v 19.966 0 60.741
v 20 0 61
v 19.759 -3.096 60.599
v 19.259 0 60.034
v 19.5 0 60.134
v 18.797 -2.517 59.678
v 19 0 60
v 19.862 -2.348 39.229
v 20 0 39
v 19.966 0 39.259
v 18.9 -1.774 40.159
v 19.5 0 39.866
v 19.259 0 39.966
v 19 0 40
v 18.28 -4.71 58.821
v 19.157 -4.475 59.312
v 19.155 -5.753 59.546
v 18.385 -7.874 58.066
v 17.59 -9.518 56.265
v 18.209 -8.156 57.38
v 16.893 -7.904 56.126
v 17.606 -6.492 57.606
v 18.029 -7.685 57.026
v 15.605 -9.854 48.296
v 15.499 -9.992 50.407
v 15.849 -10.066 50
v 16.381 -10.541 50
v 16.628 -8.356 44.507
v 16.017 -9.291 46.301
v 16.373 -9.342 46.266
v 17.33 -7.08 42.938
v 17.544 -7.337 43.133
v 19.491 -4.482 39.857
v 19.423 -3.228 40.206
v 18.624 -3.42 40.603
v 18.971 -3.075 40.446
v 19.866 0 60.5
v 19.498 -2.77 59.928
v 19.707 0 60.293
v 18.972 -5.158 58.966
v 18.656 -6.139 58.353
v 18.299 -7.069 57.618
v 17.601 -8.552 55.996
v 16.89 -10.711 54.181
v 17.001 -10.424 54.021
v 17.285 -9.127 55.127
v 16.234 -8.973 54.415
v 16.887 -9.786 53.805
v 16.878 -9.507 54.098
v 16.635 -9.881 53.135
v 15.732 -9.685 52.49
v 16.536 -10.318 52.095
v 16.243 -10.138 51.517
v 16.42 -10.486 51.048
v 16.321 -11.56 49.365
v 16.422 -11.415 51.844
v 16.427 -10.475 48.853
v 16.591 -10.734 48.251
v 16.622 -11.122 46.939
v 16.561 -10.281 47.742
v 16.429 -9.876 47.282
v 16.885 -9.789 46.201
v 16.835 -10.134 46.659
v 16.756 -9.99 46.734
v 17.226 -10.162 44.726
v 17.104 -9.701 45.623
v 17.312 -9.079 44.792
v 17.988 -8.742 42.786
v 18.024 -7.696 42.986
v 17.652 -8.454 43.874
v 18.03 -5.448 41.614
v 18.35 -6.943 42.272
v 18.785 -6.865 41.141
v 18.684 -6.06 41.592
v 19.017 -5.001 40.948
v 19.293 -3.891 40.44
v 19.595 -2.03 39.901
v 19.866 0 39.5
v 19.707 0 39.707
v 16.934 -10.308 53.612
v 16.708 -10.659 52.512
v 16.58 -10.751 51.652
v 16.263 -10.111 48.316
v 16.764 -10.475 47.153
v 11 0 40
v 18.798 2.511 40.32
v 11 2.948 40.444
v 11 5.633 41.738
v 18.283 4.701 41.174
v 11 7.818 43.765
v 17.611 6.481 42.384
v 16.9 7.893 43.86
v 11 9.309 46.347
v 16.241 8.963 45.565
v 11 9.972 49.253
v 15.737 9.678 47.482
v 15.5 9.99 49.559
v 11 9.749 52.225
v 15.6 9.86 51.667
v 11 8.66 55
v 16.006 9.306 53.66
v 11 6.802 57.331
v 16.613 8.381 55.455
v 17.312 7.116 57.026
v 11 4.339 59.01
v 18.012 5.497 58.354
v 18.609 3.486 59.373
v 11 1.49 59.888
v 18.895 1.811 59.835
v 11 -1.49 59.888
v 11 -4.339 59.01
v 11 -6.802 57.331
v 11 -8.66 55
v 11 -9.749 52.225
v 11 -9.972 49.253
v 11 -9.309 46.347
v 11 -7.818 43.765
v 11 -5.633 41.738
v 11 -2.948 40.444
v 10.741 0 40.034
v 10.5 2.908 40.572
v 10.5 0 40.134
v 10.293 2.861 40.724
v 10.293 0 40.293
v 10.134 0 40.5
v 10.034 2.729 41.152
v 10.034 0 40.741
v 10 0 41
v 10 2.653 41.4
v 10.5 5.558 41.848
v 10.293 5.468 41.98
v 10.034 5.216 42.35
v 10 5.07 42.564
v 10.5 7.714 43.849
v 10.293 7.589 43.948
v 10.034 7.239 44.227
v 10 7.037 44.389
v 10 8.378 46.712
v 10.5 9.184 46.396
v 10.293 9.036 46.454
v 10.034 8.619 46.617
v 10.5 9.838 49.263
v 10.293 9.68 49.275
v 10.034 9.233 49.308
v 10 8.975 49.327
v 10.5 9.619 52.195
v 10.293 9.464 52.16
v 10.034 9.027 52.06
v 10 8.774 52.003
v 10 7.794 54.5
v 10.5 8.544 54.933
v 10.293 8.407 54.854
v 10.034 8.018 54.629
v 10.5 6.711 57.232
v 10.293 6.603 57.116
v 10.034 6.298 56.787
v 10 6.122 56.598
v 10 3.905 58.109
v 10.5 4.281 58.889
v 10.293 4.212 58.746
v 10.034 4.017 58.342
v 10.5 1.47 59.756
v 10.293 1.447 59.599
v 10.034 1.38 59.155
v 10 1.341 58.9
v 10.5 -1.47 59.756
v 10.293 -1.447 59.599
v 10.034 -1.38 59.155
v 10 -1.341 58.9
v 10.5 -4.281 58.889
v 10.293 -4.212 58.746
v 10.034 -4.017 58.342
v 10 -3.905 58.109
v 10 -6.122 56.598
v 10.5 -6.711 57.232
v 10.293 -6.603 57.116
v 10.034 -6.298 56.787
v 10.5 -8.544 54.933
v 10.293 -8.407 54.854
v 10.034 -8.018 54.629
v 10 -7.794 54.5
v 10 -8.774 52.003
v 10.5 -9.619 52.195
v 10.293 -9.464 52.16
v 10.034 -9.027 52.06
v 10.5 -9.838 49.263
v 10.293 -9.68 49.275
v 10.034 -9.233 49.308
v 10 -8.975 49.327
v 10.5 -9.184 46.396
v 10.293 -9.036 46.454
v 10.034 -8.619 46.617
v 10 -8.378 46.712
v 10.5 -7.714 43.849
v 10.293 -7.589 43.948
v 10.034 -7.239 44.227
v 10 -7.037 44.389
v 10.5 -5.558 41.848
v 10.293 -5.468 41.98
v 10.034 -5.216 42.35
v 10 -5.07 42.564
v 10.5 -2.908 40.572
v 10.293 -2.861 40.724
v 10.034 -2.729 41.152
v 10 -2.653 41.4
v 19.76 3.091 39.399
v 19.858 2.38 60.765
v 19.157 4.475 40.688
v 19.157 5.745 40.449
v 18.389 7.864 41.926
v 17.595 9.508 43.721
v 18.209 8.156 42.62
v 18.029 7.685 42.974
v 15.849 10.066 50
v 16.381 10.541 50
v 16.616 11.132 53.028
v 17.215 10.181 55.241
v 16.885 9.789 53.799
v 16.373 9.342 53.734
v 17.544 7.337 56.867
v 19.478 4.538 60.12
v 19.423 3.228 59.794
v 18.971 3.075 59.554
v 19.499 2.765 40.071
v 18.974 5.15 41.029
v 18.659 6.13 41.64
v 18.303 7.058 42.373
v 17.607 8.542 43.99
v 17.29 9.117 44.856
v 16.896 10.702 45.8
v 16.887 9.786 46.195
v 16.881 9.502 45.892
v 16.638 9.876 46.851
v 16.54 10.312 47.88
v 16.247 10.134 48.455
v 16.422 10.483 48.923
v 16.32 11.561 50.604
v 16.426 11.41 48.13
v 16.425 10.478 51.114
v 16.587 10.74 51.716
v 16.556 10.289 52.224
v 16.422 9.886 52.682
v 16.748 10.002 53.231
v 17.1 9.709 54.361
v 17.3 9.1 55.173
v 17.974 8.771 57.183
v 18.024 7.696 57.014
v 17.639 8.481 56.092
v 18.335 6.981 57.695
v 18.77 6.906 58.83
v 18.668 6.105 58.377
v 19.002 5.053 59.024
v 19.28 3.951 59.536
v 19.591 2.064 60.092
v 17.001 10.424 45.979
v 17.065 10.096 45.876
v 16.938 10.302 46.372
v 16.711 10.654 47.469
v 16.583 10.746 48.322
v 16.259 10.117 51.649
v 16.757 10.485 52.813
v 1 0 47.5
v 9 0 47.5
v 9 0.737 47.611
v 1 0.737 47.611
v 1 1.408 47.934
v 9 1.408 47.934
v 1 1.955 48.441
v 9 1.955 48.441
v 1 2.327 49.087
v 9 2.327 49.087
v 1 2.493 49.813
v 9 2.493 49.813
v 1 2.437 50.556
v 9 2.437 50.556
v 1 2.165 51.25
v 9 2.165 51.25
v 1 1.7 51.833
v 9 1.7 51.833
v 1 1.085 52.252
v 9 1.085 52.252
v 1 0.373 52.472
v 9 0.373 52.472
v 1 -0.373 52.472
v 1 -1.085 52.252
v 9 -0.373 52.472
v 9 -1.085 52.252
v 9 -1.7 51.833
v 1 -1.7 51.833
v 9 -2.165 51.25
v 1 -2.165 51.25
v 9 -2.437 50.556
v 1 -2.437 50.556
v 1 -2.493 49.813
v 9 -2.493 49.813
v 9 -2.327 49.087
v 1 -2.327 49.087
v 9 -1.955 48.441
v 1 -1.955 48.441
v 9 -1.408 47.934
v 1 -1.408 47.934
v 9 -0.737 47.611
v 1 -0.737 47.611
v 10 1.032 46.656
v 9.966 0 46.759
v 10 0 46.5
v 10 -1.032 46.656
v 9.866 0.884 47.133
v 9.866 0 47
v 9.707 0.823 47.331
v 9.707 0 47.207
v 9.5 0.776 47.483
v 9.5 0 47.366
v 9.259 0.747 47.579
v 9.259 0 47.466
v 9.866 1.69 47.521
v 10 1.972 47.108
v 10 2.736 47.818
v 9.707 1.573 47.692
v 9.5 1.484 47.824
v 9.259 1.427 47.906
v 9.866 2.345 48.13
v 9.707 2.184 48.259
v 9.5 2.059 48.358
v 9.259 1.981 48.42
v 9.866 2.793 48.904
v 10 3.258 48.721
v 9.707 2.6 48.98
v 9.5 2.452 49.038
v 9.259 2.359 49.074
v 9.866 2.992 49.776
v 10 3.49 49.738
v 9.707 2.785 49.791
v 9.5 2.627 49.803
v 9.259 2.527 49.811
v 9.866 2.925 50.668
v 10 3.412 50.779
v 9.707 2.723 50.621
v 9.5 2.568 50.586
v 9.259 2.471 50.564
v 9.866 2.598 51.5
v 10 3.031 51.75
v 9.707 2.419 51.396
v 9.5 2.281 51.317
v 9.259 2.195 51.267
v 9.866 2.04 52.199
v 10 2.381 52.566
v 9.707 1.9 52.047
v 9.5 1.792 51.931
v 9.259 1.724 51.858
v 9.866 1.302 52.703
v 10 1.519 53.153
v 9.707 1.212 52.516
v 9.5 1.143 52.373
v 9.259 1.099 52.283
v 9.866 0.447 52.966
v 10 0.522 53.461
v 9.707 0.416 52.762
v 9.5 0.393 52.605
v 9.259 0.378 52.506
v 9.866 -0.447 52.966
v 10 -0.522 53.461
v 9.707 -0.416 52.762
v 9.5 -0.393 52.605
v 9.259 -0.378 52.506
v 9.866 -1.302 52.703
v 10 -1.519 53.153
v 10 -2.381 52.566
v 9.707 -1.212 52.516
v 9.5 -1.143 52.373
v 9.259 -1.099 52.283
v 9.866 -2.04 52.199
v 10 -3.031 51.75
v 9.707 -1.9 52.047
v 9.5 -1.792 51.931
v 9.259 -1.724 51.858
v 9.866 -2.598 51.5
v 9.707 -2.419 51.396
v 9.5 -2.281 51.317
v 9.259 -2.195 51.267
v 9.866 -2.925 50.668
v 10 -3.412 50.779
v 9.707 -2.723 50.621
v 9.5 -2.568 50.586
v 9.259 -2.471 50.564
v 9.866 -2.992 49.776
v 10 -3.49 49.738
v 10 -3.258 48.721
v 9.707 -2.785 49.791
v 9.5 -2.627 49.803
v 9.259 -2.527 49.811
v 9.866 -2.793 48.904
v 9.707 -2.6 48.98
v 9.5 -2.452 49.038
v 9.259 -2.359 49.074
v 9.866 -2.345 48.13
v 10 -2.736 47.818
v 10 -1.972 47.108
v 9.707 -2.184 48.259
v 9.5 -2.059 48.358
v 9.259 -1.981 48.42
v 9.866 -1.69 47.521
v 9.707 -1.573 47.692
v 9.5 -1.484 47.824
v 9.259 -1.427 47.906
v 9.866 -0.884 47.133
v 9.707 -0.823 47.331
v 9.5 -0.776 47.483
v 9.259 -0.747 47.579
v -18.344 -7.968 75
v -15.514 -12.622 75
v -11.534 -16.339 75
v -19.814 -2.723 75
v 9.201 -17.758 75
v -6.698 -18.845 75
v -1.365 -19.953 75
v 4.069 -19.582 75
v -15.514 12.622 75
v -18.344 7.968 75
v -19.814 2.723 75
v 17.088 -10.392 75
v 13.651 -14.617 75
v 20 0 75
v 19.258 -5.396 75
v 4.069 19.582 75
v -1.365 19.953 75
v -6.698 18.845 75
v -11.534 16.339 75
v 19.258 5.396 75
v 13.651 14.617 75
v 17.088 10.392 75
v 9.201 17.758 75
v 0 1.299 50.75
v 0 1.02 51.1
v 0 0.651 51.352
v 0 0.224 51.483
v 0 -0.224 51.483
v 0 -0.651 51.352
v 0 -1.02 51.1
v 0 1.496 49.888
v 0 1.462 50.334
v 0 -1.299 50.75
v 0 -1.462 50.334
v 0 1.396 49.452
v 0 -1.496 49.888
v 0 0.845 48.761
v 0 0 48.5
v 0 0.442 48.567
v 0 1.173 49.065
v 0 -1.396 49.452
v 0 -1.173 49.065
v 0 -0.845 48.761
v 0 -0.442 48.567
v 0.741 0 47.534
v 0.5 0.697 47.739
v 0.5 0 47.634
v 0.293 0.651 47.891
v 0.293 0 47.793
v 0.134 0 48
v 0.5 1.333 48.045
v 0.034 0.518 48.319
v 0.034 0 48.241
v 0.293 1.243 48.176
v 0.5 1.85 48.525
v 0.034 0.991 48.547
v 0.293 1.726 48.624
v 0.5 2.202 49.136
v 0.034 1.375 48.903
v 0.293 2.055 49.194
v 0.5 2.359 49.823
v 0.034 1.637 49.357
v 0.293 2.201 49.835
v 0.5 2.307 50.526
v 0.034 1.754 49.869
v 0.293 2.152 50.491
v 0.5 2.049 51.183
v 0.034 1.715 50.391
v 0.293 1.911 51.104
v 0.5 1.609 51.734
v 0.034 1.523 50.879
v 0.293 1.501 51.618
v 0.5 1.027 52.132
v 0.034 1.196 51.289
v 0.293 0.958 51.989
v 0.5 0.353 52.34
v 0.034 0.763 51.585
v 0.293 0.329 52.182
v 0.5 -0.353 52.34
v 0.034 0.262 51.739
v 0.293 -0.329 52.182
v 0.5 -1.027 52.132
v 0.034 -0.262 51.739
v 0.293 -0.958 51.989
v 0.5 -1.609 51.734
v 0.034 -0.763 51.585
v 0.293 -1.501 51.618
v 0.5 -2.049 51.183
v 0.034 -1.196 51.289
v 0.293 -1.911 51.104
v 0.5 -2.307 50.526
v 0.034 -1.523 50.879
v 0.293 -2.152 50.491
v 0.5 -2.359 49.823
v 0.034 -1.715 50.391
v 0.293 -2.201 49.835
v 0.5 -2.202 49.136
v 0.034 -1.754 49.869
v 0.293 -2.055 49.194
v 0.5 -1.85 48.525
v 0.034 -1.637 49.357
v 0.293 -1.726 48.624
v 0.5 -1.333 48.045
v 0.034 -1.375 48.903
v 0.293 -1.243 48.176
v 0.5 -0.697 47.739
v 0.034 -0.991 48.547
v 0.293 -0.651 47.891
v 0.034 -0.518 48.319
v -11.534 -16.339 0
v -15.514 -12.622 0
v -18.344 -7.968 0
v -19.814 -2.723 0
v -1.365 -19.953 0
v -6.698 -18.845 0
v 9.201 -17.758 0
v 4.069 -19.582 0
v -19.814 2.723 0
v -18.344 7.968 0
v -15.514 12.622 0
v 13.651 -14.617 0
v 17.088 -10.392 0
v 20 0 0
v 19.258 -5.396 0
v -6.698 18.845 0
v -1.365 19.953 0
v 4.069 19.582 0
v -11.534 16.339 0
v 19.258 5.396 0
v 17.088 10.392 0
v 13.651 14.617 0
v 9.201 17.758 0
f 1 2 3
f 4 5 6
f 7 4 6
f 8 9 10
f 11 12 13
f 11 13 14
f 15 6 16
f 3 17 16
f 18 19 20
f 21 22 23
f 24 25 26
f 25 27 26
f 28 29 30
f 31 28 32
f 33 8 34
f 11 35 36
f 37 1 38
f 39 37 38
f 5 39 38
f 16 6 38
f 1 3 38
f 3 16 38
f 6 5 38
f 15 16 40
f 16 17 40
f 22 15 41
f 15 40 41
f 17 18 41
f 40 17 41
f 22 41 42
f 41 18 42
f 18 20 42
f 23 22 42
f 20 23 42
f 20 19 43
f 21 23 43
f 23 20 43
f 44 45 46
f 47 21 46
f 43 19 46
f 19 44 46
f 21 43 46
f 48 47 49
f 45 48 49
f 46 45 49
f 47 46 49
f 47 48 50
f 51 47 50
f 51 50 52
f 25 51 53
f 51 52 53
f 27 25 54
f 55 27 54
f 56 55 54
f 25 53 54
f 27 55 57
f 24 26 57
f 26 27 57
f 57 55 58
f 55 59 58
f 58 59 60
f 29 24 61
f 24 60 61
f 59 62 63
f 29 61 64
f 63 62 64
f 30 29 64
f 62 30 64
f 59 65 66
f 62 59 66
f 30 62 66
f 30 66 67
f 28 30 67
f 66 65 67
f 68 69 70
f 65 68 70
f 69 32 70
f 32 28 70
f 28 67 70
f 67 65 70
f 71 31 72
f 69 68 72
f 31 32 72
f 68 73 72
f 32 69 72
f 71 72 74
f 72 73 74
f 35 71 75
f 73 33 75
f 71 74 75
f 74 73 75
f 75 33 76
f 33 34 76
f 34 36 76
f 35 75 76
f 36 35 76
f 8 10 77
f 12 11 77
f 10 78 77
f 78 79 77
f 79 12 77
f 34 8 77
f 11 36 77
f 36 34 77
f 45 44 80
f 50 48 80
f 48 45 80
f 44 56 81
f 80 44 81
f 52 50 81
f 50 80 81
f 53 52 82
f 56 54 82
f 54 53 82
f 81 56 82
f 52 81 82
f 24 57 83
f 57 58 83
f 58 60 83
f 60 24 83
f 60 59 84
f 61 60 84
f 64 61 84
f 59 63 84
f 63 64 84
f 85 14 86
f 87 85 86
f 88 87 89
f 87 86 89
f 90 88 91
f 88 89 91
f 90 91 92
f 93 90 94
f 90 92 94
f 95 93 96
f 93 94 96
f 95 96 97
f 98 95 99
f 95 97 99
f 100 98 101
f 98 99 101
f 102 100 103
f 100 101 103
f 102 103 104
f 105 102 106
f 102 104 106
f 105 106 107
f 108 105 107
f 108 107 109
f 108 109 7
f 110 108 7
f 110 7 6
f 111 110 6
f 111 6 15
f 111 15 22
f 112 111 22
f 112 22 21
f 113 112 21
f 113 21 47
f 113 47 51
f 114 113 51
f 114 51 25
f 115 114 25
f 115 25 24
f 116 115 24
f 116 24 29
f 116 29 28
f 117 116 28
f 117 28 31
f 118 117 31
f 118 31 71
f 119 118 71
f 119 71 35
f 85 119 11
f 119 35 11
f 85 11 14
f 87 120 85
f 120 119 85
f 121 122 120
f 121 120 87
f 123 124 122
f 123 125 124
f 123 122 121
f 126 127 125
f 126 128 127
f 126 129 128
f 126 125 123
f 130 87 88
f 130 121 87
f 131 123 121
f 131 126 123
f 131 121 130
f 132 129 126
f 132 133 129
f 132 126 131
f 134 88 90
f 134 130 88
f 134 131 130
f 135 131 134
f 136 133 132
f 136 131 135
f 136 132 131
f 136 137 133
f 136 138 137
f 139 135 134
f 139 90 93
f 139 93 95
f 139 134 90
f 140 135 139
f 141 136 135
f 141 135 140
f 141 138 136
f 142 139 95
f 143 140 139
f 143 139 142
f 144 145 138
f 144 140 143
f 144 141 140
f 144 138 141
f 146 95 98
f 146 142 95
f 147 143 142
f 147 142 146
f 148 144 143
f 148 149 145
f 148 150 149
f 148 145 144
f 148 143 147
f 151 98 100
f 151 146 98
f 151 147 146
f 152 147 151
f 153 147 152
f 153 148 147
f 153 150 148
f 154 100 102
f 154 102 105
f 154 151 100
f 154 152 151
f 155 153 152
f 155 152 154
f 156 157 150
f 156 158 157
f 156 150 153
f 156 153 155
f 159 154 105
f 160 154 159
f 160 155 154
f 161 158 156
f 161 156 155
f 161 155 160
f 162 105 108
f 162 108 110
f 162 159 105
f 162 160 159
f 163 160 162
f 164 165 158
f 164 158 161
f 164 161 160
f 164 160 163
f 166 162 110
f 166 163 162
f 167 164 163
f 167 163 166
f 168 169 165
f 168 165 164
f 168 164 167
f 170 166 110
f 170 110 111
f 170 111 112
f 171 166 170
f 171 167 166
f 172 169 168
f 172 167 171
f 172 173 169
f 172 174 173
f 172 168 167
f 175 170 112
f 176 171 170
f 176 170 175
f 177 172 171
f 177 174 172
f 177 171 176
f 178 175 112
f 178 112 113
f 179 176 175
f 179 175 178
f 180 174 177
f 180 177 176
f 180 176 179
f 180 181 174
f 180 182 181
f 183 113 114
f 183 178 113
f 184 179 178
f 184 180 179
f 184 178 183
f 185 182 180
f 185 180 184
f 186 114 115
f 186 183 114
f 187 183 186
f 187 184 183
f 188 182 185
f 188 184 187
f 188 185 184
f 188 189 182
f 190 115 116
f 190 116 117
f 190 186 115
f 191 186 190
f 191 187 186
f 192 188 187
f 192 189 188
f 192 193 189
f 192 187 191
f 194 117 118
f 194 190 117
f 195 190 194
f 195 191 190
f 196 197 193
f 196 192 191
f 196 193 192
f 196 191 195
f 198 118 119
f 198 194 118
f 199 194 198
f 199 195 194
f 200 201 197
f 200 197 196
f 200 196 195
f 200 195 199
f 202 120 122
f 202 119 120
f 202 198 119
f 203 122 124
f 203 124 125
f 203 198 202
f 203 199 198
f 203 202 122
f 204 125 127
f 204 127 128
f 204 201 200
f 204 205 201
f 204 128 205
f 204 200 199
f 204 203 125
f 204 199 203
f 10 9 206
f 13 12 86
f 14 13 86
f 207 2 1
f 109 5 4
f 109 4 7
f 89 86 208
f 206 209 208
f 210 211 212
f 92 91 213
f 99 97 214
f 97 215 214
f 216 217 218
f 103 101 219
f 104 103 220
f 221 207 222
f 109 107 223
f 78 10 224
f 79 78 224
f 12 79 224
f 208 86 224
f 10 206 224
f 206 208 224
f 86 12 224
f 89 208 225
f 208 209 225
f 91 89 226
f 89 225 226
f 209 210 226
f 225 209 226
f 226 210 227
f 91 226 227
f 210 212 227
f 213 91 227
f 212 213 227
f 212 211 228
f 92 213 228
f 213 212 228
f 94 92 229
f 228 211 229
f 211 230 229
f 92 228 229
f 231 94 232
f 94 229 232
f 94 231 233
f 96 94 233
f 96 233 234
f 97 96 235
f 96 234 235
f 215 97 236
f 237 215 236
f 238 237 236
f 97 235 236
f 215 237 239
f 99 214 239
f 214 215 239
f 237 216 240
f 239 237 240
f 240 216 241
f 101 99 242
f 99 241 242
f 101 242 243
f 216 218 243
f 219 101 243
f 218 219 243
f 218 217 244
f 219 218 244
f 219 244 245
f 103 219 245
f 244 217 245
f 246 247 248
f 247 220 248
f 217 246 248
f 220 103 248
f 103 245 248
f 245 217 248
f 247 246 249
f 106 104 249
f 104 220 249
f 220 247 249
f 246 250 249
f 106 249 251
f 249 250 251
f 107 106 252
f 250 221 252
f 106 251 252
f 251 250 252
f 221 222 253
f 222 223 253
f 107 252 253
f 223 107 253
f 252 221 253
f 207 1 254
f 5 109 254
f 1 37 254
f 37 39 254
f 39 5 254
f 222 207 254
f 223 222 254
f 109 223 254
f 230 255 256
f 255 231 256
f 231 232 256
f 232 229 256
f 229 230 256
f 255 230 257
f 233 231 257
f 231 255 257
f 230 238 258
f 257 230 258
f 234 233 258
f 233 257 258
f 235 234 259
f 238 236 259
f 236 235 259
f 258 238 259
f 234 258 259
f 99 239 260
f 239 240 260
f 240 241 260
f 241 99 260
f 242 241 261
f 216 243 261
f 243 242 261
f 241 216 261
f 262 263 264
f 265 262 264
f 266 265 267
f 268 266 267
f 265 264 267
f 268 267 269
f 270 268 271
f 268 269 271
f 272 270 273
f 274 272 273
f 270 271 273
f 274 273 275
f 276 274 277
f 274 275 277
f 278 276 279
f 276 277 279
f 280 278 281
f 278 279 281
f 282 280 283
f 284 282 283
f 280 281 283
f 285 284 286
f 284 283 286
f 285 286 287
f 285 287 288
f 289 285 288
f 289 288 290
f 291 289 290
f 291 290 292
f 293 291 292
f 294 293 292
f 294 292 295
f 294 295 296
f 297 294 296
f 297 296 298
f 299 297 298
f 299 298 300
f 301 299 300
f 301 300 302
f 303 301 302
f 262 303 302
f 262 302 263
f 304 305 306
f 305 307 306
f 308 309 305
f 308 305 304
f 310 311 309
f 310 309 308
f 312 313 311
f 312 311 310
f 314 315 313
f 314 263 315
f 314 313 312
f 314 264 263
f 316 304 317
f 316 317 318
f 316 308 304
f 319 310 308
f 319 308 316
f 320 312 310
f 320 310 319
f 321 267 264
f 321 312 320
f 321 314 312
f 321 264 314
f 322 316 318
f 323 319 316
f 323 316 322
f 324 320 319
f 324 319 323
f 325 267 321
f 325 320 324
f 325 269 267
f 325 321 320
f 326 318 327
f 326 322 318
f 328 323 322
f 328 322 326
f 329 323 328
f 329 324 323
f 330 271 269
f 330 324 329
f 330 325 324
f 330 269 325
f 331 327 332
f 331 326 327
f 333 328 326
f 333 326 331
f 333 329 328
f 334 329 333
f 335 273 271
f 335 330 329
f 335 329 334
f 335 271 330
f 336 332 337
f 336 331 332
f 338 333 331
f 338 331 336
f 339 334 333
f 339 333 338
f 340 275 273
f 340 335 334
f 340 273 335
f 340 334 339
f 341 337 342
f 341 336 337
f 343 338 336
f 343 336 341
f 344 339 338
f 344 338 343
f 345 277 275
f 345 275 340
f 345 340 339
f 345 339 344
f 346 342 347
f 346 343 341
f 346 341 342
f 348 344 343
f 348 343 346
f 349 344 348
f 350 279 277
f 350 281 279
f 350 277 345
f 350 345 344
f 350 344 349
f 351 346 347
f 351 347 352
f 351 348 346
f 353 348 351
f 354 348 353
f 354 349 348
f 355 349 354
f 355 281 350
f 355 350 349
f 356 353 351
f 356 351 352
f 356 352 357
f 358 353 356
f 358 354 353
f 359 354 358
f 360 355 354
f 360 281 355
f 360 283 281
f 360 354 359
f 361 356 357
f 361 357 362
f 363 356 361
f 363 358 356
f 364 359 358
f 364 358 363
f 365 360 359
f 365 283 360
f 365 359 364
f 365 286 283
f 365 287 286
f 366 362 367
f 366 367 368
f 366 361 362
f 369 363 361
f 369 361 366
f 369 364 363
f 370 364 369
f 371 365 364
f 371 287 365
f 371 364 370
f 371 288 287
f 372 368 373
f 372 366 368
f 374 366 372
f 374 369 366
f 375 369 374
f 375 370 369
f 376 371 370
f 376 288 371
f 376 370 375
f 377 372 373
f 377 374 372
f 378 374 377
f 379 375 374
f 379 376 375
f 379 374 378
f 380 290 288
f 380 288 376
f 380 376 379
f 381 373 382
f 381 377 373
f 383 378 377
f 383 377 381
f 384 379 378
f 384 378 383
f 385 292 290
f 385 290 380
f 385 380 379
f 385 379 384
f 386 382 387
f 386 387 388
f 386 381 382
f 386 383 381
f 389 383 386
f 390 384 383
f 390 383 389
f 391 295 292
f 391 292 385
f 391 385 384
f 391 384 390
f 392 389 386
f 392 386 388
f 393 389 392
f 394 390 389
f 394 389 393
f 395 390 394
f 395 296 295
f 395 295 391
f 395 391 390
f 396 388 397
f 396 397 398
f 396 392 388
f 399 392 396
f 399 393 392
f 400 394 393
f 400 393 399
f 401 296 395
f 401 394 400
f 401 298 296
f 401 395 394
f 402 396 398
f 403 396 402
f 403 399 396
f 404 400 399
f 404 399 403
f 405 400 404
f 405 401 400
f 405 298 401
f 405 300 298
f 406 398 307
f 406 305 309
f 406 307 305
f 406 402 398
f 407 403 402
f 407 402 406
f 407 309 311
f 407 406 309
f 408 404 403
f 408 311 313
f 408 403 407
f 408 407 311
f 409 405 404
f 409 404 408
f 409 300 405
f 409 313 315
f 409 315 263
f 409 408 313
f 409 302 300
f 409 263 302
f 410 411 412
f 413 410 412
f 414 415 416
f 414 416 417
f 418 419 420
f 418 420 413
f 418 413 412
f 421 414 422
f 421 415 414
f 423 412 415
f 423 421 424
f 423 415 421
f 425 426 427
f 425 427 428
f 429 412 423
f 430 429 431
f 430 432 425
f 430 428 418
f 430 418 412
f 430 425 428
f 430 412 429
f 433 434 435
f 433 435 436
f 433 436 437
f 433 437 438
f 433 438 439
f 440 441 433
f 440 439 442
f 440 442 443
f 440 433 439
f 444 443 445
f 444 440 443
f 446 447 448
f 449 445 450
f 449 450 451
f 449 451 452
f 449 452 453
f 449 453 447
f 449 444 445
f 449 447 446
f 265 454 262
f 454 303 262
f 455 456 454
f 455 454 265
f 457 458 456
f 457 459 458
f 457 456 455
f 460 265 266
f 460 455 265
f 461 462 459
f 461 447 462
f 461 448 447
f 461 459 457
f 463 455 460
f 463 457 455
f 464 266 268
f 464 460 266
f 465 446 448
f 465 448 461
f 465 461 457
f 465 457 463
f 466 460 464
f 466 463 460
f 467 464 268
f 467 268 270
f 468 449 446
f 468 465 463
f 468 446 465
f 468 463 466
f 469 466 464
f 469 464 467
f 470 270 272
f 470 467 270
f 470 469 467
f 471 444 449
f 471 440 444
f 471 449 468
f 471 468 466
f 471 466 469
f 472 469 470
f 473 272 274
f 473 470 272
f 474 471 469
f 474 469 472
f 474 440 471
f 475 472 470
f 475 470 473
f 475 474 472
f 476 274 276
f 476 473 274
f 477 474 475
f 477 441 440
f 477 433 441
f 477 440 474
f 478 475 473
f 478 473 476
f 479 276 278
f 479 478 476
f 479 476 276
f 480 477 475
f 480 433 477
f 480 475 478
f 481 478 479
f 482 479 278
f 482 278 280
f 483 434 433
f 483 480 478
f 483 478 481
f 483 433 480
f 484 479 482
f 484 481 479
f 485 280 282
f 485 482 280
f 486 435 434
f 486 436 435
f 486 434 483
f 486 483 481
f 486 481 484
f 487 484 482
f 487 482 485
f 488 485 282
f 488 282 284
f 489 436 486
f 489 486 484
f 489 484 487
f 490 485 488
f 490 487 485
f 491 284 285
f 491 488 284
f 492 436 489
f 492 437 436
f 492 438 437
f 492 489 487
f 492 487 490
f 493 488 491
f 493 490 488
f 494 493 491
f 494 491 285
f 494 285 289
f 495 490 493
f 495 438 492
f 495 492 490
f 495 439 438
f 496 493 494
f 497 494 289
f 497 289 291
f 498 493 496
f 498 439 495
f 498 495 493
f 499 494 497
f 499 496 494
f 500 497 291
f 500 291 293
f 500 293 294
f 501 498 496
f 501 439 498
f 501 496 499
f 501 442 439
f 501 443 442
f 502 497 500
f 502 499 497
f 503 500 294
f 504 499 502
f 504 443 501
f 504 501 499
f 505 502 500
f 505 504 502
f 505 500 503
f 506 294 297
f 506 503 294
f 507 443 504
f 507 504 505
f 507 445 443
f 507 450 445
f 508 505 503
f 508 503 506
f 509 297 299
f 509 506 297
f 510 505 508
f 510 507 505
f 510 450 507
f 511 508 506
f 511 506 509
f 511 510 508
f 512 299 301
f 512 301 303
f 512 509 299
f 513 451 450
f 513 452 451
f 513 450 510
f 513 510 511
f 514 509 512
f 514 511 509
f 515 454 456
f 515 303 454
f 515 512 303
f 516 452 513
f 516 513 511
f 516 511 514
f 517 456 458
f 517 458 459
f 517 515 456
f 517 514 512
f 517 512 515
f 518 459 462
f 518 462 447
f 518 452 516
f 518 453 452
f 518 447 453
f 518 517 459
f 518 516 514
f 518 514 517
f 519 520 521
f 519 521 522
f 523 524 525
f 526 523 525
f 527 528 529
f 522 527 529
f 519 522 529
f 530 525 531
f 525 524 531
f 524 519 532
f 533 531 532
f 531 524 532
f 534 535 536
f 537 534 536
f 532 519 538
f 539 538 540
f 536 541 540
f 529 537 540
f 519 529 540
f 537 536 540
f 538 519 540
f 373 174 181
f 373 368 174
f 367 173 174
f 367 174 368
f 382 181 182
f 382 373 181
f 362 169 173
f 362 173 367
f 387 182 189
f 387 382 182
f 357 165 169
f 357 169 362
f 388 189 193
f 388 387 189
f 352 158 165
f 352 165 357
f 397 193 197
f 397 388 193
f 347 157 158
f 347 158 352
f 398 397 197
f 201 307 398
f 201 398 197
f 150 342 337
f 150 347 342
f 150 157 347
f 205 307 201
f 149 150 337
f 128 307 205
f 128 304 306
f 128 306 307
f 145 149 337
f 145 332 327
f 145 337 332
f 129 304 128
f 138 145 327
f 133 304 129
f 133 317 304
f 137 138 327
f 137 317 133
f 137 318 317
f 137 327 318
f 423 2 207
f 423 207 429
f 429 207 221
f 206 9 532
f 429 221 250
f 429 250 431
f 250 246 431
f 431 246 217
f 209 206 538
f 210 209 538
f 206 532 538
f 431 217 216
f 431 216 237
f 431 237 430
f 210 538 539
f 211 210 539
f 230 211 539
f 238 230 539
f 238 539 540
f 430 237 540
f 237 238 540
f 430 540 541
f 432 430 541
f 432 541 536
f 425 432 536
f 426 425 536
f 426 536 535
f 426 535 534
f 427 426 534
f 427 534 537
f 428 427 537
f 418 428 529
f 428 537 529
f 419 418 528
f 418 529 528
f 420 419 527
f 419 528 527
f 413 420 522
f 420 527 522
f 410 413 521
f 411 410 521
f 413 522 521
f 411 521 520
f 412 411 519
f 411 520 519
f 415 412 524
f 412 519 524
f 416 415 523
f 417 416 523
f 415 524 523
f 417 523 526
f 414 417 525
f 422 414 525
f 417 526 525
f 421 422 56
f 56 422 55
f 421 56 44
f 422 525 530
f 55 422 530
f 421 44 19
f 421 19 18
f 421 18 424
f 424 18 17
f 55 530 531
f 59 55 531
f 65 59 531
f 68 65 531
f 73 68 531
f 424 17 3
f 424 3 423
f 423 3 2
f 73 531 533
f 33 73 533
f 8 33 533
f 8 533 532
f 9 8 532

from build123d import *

# Parameters (mm, degrees)
SKETCH1_R           = 20
BOSS_EXTRUDE1_DEPTH = 75
SKETCH2_R           = 10
CUT_EXTRUDE1_DEPTH  = 10
SKETCH3_R           = 2.5
CUT_EXTRUDE2_DEPTH  = 20
FILLET1_R           = 1


with BuildPart() as part:
    # Sketch1 → Boss-Extrude1 (new body)
    with BuildSketch(Plane.XY):
        Circle(SKETCH1_R)
    extrude(amount=BOSS_EXTRUDE1_DEPTH)

    # Sketch2 → Cut-Extrude1 (cut)
    with BuildSketch(Plane(origin=(20, 0, 0), x_dir=(0, 0, -1), z_dir=(1, 0, 0))):
        with Locations((-50, 0)):
            Circle(SKETCH2_R)
    extrude(amount=-CUT_EXTRUDE1_DEPTH, mode=Mode.SUBTRACT)

    # Sketch3 → Cut-Extrude2 (cut)
    with BuildSketch(Plane(origin=(20, 0, 0), x_dir=(0, 0, -1), z_dir=(1, 0, 0))):
        with Locations((-50, 0)):
            Circle(SKETCH3_R)
    extrude(amount=-CUT_EXTRUDE2_DEPTH, mode=Mode.SUBTRACT)

    # Fillet1
    fillet1_edges = [part.edges().sort_by_distance(p)[0] for p in [
        (10, 0, 52.5),
        (0, 0, 52.5),
        (17.320510975, 9.999994979, 50.010021457),
        (10, 0, 60),
    ]]
    fillet(fillet1_edges, radius=FILLET1_R - 0.0001)  # a hair under: the kernel refuses the full size


solid = part.part
